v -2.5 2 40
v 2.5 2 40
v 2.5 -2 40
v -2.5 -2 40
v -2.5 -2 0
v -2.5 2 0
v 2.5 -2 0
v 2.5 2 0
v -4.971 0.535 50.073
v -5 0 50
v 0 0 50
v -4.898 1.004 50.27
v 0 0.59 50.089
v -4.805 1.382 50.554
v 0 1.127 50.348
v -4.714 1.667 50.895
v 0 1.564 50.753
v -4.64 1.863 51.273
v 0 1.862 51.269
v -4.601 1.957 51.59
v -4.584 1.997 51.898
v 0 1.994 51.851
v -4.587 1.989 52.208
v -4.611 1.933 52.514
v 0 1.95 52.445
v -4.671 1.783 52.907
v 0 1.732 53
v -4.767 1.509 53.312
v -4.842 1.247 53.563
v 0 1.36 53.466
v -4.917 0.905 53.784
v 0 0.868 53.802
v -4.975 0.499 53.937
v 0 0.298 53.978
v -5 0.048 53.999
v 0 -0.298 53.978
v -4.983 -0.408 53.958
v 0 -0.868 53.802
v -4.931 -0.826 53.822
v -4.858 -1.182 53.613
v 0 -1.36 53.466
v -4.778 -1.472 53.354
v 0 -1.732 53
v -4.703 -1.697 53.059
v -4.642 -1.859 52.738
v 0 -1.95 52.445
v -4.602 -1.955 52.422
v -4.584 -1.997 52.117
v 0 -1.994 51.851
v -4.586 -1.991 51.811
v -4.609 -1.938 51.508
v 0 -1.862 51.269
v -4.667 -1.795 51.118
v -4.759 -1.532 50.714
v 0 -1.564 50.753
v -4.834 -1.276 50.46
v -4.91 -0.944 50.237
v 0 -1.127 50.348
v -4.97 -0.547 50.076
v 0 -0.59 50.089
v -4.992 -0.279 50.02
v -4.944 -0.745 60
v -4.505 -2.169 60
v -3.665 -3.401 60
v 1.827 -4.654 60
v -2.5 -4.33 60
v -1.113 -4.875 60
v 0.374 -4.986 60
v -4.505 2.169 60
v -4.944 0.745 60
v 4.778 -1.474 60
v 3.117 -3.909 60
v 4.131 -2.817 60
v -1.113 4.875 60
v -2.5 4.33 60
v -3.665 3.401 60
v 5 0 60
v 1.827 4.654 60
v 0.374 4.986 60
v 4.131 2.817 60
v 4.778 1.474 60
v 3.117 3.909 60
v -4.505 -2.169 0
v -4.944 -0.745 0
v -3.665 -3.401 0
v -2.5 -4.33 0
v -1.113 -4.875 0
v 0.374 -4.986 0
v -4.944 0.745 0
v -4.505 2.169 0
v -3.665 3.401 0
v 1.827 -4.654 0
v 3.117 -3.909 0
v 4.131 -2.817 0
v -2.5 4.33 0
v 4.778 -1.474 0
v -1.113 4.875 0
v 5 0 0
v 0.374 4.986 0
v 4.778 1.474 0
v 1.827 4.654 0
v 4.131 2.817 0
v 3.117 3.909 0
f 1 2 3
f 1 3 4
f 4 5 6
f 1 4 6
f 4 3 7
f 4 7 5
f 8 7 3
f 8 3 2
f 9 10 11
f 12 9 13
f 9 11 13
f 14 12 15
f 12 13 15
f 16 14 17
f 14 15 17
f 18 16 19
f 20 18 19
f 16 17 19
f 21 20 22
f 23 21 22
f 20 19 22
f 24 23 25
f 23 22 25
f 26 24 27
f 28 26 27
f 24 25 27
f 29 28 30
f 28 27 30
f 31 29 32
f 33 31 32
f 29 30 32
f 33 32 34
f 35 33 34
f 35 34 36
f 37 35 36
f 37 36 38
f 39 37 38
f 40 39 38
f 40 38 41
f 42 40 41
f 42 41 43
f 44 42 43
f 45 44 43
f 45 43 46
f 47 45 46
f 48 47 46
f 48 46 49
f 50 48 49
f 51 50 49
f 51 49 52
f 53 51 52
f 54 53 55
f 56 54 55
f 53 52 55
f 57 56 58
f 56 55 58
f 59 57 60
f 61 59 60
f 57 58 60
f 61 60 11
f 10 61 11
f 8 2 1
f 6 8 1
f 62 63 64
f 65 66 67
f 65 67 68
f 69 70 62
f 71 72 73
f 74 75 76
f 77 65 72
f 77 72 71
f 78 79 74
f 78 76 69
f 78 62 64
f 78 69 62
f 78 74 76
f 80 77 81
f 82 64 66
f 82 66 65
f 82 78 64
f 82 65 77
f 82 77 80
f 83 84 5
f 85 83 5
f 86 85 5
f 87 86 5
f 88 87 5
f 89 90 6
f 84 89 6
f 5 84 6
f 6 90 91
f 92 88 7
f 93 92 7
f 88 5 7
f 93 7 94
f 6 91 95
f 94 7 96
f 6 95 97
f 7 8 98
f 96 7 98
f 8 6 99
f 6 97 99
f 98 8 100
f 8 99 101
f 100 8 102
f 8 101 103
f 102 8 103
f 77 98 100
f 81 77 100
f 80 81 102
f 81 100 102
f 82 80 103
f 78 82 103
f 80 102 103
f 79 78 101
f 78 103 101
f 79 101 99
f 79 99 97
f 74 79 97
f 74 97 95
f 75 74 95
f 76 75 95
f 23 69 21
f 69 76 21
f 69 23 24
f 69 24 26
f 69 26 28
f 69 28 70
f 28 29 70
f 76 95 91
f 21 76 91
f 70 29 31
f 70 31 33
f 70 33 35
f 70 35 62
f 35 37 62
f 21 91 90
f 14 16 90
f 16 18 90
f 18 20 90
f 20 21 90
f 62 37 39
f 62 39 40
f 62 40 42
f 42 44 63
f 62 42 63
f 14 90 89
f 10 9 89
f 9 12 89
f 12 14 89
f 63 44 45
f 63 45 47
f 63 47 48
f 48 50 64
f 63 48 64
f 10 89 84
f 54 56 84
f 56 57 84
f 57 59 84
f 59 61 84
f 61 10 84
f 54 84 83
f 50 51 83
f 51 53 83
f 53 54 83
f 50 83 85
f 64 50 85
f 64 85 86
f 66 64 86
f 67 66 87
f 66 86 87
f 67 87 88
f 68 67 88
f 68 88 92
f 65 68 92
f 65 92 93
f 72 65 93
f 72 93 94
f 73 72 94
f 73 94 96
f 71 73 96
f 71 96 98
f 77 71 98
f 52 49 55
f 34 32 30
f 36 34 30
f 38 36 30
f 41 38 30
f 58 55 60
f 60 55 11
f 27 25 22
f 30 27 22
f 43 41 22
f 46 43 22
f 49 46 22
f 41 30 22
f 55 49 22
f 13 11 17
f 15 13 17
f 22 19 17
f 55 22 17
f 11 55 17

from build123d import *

# Parameters (mm, degrees)
SKETCH1_R           = 5
BOSS_EXTRUDE1_DEPTH = 60
SKETCH2_W           = 5
SKETCH2_H           = 4
CUT_EXTRUDE1_DEPTH  = 40
SKETCH4_R           = 2
CUT_EXTRUDE2_DEPTH  = 40


with BuildPart() as part:
    # Sketch1 → Boss-Extrude1 (new body)
    with BuildSketch(Plane.XY):
        Circle(SKETCH1_R)
    extrude(amount=BOSS_EXTRUDE1_DEPTH)

    # Sketch2 → Cut-Extrude1 (cut)
    with BuildSketch(Plane(origin=(0, 0, 0), x_dir=(-1, 0, 0), z_dir=(0, 0, -1))):
        Rectangle(SKETCH2_W, SKETCH2_H)
    extrude(amount=-CUT_EXTRUDE1_DEPTH, mode=Mode.SUBTRACT)

    # Sketch4 → Cut-Extrude2 (cut)
    with BuildSketch(Plane(origin=(0, 0, 0), x_dir=(0, 0, -1), z_dir=(1, 0, 0))):
        with Locations((-52, 0)):
            Circle(SKETCH4_R)
    extrude(amount=-CUT_EXTRUDE2_DEPTH, mode=Mode.SUBTRACT)


solid = part.part
